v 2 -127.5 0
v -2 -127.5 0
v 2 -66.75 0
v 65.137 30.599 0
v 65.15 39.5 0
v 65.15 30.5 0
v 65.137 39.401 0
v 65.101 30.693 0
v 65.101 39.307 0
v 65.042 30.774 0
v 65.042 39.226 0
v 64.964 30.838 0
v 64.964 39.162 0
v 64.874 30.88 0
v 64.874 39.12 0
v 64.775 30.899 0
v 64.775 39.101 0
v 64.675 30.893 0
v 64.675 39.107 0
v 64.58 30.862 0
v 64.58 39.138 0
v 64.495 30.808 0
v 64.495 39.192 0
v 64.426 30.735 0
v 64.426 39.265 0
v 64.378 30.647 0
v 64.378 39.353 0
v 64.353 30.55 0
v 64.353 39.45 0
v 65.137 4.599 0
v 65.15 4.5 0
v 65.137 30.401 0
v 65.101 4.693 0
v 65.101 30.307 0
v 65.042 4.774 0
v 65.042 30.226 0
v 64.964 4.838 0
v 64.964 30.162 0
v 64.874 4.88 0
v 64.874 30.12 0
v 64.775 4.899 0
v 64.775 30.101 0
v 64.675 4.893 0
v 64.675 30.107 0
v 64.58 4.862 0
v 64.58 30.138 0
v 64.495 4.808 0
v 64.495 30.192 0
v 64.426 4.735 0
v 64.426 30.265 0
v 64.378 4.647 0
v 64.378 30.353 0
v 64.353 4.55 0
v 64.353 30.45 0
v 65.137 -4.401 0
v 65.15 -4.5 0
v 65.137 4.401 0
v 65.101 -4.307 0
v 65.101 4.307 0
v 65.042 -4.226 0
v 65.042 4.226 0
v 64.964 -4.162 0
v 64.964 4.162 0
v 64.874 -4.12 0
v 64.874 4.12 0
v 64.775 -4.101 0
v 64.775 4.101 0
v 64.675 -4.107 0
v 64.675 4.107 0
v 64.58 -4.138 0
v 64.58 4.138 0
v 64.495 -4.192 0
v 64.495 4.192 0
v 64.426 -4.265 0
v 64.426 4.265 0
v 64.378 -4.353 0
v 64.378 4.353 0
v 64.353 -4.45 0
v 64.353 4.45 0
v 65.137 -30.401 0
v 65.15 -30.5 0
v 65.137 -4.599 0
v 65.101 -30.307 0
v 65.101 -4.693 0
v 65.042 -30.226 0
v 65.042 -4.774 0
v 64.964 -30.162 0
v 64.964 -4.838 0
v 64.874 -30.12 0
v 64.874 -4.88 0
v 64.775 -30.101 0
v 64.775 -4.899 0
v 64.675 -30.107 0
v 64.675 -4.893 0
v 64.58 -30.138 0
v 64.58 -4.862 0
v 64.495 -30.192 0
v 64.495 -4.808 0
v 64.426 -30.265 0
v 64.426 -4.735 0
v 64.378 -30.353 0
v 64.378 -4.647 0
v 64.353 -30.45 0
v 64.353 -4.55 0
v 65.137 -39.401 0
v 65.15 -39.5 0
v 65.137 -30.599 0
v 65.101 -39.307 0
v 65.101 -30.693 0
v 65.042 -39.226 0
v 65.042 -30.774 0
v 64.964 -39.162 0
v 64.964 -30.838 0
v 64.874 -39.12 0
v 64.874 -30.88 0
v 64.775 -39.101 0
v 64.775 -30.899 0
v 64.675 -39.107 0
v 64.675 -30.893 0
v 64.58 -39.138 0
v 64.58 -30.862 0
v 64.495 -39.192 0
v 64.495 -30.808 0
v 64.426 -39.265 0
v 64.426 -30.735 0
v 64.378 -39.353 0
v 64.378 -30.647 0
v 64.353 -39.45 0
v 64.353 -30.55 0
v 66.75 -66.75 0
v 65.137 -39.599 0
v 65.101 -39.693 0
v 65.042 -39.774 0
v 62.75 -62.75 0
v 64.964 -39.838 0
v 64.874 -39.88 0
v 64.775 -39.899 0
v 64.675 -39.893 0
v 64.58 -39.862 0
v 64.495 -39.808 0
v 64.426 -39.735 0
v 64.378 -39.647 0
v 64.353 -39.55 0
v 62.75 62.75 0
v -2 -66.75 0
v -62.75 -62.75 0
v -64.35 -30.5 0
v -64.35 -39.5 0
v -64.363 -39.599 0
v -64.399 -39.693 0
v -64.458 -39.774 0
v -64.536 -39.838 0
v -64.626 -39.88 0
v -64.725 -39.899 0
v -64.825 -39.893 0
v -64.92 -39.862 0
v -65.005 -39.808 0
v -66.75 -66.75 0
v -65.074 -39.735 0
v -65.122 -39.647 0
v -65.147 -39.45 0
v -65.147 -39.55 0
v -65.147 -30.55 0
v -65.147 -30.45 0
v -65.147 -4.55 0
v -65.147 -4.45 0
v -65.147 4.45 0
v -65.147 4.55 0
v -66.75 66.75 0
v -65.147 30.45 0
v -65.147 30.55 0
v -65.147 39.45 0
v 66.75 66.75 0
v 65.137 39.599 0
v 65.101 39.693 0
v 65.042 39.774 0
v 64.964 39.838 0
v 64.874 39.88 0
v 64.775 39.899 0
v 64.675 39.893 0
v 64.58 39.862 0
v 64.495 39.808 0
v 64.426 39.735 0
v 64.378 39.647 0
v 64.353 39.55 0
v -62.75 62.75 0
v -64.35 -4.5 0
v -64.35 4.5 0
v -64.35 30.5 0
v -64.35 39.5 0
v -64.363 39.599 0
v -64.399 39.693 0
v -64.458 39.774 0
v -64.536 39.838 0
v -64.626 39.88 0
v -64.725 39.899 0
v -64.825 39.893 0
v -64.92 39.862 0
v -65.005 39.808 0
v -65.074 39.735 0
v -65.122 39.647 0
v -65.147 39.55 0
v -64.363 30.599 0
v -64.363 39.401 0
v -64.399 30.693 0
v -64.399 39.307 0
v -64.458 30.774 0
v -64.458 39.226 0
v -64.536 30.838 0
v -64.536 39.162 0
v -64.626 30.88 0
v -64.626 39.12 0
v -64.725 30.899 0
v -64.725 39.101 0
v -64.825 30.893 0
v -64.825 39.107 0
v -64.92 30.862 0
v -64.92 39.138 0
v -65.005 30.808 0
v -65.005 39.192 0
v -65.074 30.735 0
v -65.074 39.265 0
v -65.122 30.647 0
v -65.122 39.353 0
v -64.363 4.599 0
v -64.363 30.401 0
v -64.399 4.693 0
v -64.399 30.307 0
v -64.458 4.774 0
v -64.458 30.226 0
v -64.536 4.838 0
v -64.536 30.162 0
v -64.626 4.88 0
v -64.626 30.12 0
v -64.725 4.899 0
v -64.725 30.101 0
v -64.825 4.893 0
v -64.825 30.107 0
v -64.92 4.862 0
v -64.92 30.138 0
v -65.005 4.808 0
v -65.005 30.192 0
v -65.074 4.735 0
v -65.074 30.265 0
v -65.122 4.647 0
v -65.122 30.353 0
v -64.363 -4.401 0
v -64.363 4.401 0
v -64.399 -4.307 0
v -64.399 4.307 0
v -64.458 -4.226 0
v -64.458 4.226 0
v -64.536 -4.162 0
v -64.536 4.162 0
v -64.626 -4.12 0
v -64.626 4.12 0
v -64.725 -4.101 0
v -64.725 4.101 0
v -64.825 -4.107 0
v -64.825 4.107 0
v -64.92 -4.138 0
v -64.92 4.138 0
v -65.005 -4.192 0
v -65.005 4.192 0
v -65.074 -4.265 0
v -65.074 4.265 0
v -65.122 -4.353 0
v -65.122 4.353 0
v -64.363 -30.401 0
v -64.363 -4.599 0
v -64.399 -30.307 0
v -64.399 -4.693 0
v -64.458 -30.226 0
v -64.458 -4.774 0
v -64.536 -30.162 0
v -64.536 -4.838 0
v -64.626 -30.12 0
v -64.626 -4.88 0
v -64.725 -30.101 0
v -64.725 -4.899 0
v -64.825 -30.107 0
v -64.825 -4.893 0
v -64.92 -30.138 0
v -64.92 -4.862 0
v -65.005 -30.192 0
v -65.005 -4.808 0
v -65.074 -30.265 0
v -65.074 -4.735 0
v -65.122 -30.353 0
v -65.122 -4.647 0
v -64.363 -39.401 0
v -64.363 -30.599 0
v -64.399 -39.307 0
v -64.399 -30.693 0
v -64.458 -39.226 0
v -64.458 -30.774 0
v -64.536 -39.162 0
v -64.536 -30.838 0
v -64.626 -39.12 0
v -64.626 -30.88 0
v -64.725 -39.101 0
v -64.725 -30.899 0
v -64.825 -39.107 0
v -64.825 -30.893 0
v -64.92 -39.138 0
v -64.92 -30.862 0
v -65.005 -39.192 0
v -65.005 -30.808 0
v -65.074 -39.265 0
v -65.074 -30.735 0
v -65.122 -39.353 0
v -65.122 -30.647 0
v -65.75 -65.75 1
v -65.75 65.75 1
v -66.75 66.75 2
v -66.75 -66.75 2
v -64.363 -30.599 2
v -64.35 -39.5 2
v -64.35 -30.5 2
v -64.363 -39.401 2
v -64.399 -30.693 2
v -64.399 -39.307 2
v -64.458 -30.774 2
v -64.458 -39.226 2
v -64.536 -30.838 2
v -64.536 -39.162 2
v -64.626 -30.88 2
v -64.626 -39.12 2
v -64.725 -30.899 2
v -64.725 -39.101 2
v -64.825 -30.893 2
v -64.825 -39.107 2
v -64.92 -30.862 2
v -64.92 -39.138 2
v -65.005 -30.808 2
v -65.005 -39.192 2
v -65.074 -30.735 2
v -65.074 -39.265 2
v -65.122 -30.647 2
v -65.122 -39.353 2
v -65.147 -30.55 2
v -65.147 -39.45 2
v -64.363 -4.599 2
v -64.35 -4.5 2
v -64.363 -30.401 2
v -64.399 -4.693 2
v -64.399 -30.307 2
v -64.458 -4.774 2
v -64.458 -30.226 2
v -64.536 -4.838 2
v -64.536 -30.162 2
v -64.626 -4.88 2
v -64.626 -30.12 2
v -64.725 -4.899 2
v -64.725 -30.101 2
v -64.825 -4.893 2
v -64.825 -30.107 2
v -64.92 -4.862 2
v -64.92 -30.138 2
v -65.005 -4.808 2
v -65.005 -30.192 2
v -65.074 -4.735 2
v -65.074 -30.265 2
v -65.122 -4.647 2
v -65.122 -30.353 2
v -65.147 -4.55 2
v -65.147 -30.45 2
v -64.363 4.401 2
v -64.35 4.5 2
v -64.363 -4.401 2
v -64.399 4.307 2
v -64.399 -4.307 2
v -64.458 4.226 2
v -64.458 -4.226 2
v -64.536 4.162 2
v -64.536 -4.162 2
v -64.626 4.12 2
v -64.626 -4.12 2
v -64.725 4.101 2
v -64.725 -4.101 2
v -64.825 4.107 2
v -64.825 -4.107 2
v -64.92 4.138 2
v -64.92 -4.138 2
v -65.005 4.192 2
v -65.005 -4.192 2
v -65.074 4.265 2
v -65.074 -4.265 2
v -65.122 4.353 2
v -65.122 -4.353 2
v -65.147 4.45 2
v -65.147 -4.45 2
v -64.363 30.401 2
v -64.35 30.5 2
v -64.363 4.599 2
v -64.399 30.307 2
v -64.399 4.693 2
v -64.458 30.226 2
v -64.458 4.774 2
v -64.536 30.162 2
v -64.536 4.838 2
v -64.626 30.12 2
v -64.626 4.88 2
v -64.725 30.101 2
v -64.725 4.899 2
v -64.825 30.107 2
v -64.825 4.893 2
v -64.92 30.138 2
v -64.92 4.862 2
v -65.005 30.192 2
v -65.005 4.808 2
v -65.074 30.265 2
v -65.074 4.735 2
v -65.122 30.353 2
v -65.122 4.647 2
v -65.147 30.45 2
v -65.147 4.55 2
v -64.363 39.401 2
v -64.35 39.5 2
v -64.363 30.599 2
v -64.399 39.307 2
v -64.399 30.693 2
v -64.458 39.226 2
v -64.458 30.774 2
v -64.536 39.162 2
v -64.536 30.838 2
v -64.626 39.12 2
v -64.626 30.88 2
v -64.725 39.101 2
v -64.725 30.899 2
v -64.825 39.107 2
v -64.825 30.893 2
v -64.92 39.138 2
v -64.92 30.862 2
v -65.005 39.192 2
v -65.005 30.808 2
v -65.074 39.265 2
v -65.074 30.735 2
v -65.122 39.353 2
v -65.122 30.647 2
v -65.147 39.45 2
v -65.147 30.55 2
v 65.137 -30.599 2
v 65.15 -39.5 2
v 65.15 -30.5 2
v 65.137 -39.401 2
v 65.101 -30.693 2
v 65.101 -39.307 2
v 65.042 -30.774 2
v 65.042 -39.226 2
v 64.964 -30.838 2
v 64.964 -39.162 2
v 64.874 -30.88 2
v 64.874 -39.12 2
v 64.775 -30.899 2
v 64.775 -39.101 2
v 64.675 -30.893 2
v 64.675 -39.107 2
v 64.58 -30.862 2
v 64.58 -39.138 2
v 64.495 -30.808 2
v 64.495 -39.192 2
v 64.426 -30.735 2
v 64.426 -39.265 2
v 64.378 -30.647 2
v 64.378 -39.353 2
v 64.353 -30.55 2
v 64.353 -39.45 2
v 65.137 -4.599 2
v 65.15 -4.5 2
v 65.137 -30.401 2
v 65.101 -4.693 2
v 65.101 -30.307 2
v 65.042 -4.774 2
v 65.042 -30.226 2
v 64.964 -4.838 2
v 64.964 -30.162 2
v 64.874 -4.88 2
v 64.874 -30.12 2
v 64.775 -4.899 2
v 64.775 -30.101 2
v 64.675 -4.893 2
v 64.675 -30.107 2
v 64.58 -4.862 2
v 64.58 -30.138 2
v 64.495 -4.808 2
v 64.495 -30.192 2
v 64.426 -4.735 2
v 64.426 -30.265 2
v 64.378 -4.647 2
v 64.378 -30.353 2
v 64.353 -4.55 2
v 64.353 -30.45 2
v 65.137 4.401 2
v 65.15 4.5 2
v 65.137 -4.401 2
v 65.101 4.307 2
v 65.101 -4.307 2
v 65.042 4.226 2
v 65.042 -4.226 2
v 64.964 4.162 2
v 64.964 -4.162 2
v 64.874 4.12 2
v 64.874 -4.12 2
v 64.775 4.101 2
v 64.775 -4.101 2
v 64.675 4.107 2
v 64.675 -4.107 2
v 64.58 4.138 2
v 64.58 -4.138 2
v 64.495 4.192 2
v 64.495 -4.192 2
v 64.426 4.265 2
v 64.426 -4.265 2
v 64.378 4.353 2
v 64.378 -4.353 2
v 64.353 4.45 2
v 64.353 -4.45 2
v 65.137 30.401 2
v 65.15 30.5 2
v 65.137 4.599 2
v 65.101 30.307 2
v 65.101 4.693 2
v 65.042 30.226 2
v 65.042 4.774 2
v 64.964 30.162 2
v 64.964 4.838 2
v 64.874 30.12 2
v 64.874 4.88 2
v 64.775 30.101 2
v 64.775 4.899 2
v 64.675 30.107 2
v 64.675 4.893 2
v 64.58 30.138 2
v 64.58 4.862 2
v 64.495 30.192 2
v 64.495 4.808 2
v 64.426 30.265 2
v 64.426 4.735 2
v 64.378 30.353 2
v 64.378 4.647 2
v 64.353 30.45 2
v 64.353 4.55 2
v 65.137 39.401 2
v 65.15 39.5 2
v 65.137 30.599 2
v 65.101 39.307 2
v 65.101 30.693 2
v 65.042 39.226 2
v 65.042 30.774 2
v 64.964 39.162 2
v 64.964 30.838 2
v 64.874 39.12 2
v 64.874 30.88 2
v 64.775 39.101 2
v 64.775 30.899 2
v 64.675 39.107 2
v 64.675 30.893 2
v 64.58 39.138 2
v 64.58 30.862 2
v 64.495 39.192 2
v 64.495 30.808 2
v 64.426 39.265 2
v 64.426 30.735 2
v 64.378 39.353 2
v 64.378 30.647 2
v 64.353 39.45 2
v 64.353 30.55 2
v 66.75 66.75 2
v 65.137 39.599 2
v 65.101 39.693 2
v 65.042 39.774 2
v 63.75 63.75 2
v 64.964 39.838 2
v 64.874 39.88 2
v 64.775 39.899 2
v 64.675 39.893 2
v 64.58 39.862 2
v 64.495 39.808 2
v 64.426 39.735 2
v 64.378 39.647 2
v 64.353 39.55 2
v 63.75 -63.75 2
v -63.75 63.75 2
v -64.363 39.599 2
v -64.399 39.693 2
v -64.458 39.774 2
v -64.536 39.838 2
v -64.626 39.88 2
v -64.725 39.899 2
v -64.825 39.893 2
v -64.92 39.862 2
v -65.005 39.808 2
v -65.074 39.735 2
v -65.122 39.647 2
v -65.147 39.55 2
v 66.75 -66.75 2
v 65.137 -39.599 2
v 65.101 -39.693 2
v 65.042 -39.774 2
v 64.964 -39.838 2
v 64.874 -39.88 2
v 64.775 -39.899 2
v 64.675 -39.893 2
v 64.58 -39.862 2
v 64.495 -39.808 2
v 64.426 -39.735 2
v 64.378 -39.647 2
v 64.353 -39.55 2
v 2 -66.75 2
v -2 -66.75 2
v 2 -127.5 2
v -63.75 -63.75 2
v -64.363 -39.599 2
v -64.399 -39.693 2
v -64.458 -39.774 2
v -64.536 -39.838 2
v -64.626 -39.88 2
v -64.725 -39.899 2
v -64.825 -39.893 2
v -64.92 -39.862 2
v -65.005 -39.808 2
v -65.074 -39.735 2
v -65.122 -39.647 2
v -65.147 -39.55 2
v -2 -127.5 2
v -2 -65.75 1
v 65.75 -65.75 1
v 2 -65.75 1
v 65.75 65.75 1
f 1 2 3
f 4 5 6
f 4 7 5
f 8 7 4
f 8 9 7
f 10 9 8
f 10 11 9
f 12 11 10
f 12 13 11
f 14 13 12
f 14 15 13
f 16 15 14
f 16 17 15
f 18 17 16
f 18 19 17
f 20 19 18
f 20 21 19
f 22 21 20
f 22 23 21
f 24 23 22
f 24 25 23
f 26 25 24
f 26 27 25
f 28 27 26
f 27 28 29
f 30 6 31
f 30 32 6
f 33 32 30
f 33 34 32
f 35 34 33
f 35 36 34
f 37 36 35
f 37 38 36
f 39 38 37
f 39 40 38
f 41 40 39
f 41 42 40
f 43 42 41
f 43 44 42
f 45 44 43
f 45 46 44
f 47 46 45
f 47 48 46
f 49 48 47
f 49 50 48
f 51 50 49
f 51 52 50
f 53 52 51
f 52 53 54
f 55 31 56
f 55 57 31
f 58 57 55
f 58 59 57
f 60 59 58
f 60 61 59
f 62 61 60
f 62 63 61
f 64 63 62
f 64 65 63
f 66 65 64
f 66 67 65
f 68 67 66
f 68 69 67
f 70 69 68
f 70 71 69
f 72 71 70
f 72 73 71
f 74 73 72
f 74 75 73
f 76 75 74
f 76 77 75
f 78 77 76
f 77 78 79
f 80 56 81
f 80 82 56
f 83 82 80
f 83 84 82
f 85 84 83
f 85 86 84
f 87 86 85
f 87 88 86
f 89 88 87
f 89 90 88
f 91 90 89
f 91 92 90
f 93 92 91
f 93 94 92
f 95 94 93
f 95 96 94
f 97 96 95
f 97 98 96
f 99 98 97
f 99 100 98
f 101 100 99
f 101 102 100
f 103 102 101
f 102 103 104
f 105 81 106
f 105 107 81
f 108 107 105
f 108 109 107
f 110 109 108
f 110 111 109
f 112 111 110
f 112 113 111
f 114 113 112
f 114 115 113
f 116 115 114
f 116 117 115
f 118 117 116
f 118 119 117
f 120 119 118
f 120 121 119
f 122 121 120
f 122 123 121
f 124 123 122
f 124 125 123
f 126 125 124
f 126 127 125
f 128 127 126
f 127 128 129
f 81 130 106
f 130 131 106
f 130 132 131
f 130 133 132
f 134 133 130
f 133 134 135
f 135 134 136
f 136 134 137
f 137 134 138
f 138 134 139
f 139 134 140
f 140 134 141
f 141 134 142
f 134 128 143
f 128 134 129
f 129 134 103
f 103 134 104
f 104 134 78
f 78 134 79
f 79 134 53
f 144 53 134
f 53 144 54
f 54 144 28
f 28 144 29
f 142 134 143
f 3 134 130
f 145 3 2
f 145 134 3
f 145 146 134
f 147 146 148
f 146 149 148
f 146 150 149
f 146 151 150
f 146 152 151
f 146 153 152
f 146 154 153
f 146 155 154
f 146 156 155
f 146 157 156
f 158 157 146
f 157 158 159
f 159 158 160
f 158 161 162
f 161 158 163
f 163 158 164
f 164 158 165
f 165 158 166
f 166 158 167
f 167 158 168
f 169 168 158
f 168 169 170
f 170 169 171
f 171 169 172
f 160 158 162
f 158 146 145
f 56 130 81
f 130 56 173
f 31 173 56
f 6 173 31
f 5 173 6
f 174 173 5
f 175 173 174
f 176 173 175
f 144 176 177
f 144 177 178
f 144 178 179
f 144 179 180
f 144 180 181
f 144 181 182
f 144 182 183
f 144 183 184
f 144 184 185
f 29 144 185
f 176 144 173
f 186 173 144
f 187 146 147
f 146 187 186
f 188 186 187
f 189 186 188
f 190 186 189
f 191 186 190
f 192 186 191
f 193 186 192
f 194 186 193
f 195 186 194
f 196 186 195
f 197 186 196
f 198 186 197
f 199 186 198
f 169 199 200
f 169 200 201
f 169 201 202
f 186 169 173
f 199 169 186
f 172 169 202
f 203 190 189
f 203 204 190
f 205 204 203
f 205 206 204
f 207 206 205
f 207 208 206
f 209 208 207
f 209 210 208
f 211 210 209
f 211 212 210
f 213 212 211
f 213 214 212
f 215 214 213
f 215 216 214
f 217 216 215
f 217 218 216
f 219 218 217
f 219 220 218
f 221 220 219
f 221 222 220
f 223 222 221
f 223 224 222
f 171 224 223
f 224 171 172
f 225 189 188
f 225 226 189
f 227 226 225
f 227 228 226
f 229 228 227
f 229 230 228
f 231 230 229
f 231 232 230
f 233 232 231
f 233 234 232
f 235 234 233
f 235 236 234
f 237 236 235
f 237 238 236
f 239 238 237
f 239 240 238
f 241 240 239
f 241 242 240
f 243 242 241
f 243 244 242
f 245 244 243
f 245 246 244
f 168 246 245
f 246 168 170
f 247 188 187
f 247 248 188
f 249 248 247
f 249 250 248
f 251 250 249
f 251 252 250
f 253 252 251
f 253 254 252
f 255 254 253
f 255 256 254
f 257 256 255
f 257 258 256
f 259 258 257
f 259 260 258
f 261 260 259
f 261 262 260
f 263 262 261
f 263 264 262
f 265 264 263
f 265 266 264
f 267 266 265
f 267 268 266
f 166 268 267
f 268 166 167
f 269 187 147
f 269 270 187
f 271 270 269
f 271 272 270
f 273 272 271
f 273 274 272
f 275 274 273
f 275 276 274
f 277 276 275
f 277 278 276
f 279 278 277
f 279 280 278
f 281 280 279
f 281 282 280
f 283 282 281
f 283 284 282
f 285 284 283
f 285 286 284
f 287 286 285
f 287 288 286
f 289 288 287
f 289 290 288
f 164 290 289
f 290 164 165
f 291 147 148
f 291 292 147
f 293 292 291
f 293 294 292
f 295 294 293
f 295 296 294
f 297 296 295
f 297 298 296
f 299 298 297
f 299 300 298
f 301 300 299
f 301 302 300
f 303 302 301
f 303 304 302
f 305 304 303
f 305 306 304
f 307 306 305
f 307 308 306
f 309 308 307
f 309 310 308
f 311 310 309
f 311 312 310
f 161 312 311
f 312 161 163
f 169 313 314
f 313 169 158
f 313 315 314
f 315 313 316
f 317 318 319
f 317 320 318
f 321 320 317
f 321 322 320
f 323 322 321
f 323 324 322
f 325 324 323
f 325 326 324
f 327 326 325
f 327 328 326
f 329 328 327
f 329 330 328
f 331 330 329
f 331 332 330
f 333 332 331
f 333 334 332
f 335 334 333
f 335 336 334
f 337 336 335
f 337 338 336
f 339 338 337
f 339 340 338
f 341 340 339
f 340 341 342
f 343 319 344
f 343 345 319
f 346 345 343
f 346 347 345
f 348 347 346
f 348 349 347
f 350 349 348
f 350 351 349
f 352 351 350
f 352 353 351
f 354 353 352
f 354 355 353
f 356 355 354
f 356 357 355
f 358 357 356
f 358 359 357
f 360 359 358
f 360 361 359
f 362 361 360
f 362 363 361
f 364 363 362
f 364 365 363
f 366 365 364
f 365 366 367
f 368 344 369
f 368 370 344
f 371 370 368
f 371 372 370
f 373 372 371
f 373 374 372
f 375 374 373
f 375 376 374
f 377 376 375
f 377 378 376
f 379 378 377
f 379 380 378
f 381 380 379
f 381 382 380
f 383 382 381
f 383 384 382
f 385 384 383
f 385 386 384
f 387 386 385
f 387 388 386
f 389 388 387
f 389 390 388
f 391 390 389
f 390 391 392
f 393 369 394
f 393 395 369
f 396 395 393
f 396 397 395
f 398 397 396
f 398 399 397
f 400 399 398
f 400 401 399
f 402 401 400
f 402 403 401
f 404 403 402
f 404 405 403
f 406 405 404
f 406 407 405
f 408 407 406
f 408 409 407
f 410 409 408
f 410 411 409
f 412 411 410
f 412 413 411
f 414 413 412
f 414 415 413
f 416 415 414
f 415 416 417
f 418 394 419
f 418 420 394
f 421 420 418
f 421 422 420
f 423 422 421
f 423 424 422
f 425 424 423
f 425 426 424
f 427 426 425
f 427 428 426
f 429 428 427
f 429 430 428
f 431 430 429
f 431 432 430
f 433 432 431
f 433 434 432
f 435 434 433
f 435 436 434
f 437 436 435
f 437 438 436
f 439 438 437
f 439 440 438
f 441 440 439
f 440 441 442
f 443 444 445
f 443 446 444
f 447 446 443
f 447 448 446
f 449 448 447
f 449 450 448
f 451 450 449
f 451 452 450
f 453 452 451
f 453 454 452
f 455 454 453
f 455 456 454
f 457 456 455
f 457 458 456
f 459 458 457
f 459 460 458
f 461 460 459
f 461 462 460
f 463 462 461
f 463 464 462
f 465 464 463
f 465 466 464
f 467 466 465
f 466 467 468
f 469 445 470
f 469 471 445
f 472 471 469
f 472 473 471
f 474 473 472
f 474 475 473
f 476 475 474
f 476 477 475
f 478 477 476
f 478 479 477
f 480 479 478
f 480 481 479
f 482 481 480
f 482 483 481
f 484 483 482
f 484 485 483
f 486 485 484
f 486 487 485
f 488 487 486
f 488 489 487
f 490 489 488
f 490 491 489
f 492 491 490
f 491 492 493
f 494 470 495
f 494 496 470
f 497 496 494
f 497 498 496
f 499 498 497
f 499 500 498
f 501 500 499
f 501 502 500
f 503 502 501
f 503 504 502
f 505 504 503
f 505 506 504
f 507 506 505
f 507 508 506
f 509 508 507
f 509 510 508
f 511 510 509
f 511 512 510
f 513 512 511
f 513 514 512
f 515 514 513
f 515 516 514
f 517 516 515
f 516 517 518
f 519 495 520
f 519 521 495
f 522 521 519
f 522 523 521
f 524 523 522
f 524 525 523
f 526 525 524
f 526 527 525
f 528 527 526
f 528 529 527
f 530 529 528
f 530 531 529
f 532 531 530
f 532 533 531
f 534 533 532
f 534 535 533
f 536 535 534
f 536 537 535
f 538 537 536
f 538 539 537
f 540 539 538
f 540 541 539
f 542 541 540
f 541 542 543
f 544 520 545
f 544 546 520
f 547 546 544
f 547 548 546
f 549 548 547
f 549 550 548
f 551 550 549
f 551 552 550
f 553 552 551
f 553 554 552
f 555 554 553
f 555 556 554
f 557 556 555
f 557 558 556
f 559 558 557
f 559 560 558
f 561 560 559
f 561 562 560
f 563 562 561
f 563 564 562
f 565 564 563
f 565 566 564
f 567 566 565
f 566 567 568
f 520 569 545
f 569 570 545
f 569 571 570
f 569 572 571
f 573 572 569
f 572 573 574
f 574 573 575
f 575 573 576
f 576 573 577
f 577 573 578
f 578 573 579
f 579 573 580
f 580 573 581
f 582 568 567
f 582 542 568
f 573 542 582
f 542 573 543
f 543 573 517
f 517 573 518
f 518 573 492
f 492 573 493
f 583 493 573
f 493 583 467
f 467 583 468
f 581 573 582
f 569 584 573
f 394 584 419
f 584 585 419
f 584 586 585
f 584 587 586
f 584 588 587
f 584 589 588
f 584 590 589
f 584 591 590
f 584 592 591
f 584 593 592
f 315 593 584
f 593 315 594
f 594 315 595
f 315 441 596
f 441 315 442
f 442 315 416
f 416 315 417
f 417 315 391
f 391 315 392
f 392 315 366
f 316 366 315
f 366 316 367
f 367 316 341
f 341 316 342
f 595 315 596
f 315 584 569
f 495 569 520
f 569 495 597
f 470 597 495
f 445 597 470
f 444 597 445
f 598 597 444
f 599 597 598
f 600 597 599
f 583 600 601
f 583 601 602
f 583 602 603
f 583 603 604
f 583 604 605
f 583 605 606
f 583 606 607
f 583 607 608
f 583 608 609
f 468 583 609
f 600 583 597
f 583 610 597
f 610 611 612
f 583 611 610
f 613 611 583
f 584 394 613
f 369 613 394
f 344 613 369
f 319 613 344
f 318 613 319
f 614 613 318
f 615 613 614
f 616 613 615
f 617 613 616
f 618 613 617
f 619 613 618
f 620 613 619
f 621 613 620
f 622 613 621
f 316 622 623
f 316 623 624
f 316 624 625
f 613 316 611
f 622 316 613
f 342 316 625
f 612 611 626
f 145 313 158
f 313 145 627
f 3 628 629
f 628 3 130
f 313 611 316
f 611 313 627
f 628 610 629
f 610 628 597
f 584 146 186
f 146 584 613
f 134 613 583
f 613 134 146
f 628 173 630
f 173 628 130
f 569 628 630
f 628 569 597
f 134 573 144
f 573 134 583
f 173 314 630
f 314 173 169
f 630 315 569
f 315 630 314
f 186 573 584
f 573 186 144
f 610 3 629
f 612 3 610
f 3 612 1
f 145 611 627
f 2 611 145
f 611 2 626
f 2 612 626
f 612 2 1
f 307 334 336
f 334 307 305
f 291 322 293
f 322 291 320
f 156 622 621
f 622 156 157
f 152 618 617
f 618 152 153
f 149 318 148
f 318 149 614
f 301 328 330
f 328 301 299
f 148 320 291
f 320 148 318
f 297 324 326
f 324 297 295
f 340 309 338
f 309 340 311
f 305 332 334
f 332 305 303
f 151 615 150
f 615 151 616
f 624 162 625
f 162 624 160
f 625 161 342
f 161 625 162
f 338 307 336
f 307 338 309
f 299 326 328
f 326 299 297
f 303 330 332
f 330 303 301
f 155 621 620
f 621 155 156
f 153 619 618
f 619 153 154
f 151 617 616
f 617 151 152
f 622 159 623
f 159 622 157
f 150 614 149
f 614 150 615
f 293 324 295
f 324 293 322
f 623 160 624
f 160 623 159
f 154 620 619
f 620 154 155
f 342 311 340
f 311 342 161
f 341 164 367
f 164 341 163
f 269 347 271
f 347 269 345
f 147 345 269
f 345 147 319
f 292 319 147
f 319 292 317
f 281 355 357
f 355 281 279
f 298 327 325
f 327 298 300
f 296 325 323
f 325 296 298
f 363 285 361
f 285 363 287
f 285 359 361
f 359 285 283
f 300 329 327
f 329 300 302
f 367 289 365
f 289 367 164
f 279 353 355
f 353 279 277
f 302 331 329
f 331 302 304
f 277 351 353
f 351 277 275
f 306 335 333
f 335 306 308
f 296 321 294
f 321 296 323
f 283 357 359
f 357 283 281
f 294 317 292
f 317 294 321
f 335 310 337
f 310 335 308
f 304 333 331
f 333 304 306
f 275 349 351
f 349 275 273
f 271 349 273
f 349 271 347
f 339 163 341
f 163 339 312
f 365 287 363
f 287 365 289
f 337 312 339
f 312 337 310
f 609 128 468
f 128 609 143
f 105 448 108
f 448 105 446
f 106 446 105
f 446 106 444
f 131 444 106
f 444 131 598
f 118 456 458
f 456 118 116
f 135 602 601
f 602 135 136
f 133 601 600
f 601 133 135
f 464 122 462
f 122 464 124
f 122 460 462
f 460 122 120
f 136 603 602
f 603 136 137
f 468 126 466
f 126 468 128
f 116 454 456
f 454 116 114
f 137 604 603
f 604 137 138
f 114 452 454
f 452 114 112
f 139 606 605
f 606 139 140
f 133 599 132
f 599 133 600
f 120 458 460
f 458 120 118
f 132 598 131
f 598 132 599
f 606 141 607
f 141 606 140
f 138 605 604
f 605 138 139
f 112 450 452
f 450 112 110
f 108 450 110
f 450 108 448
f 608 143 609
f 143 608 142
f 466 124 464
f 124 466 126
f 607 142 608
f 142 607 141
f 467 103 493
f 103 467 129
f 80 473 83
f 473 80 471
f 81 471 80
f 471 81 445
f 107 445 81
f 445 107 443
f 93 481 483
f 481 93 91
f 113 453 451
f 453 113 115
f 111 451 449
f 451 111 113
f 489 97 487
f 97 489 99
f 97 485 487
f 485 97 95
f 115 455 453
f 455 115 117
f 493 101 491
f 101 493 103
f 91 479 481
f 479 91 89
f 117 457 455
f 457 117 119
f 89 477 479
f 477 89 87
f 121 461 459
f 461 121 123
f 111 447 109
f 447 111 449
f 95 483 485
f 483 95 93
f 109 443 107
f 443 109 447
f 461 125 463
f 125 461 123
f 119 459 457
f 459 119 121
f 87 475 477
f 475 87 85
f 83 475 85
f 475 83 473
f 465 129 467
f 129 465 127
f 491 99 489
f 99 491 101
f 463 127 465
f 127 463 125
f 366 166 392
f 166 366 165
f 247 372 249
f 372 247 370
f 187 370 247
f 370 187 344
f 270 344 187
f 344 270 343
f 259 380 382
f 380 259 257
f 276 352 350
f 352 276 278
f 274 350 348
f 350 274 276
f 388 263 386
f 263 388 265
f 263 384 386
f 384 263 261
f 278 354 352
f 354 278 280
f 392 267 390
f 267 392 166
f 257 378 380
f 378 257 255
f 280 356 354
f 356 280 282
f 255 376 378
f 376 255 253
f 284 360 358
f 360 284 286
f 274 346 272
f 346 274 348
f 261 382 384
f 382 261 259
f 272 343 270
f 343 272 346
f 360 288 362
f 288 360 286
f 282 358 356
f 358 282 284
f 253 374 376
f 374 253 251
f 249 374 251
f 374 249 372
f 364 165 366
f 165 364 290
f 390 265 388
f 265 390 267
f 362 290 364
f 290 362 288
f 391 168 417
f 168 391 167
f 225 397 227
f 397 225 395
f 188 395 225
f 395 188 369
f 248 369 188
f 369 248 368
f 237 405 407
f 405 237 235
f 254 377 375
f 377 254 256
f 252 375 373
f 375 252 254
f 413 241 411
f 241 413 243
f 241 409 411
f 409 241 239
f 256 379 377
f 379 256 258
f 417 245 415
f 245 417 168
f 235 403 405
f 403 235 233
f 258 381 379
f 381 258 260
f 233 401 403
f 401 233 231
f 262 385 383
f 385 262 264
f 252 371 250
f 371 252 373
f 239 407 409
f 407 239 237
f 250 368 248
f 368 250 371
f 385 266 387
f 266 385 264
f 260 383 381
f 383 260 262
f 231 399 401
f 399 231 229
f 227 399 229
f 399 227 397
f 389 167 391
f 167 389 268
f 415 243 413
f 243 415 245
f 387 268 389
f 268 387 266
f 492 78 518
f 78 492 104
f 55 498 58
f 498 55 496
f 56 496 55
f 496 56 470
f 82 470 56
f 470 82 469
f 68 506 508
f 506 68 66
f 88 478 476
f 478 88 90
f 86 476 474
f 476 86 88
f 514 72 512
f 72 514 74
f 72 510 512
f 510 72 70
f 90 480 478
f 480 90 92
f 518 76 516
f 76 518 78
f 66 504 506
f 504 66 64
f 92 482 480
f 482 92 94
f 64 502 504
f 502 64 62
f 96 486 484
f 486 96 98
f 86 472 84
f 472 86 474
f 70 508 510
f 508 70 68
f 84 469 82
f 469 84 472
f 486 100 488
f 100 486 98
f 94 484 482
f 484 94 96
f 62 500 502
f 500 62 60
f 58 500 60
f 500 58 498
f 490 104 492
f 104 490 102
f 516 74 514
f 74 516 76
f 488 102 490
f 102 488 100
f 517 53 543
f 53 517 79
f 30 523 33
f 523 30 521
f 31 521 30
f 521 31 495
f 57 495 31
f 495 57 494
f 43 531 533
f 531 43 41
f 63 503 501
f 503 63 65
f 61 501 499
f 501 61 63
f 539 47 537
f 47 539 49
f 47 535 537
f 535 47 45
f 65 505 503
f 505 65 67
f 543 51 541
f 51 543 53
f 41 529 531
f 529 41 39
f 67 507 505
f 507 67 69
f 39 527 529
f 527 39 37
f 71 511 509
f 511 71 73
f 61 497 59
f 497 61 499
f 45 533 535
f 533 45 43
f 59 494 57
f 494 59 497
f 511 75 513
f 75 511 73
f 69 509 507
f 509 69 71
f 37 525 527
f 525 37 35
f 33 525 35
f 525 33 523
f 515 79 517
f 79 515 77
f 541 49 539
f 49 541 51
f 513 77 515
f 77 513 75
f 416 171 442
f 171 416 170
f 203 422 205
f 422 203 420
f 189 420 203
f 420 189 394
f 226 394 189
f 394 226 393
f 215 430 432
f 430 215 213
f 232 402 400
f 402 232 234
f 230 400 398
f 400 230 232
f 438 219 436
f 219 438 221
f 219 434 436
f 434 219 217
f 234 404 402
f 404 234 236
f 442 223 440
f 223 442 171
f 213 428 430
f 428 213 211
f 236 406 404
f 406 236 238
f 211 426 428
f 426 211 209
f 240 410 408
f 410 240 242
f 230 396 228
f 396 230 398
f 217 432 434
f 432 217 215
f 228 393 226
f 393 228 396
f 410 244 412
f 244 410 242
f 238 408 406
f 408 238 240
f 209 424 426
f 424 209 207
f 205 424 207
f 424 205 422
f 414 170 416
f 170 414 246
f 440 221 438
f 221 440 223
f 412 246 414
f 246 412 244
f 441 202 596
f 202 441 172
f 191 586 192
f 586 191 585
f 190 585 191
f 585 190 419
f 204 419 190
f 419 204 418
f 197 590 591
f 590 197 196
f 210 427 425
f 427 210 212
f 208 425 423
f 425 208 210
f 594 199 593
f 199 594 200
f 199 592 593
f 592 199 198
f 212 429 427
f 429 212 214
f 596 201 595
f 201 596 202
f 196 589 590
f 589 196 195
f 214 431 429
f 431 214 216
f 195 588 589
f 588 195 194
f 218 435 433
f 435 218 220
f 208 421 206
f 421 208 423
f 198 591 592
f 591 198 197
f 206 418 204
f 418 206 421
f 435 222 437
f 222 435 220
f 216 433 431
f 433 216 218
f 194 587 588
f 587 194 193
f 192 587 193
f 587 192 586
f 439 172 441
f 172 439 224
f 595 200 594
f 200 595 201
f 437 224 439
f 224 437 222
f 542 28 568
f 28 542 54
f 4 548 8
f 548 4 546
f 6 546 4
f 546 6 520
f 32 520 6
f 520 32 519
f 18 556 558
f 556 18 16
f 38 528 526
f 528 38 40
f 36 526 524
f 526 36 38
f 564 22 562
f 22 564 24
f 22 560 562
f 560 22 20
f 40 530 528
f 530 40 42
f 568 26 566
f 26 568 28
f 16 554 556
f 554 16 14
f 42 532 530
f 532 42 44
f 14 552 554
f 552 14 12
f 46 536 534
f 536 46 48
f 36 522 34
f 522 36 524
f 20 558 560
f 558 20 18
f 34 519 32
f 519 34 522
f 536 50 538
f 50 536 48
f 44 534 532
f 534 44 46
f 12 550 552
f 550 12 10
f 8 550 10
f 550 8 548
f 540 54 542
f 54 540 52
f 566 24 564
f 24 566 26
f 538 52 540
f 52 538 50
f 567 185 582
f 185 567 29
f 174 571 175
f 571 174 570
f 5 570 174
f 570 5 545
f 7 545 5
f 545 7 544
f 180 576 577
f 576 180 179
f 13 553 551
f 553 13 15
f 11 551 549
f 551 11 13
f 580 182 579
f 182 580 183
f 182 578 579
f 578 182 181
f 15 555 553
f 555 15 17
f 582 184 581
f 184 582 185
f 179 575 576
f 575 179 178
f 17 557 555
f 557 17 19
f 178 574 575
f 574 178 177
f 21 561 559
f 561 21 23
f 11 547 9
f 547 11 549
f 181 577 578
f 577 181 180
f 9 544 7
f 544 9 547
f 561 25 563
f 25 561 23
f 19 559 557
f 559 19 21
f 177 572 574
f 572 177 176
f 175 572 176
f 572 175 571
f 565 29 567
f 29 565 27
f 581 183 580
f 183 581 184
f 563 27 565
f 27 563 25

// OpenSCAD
solar_cell_diameter = 125;
solar_cell_diameter_diagonal = 160;
solar_cell_to_frame_gap = 0.25;
solar_frame_diameter = 4;
solar_frame_thickness = 2;
solar_frame_length = solar_cell_diameter + (solar_cell_to_frame_gap + solar_frame_diameter) * 2;
solar_frame_length_diagonal = solar_cell_diameter_diagonal + (solar_cell_to_frame_gap + solar_frame_diameter) * 2;
solar_facet_diameter = solar_cell_diameter + (solar_cell_to_frame_gap + solar_frame_diameter + 3) * 2;
solar_staple_width = 9;
solar_staple_diameter = 0.8;

module solar_panel_frame_side(length) {
    linear_extrude(height = length, convexity = 10, center = false) {
        polygon(points = [
            [0, 0],
            [-solar_frame_thickness / 2, -solar_frame_thickness],
            [-solar_frame_diameter, -solar_frame_thickness],
            [-solar_frame_diameter + solar_frame_thickness / 2, -solar_frame_thickness / 2],
            [-solar_frame_diameter, 0]
        ]);
    }
}

module solar_panel_frame_corner(length) {
    union() {
        intersection() {
            solar_panel_frame_side(length / 2);
            translate([length / 2 - solar_frame_diameter, 0, solar_frame_diameter]) {
                rotate([0, -90, 0]) {
                    solar_panel_frame_side(length / 2);
                }
            }
        }
        translate([0, 0, solar_frame_diameter / 2]) {
            solar_panel_frame_side(length / 2 - solar_frame_diameter / 2);
        }
        translate([length / 2 - solar_frame_diameter, 0, solar_frame_diameter]) {
            rotate([0, -90, 0]) {
                solar_panel_frame_side(length / 2 - solar_frame_diameter / 2);
            }
        }
    }
}

module solar_panel_frame_sides(length) {
    for (i = [0 : 3]) {
        rotate([0, 0, i * 90]) {
            rotate([-90, 0, 0]) {
                translate([-length / 2 + solar_frame_diameter, 0, -length / 2]) {
                    solar_panel_frame_corner(length);
                }
            }
        }
    }
}

module solar_cell(
        main_diameter = 125,
        diagonal_diameter = 160,
        thickness = 2) {
    difference() {
        union() {
            solar_panel_frame_sides(solar_frame_length);
            /*rotate([0, 0, 45]) {
                solar_panel_frame_sides(solar_frame_length_diagonal);
            }*/
            translate([-solar_frame_diameter / 2, -solar_frame_length + solar_frame_diameter * 1.5, 0]) {
                cube([solar_frame_diameter, solar_cell_diameter / 2, solar_frame_thickness]);
            }
        }
        for (i = [-1 : 1]) {
            translate([0, i * 35, 0]) {
                translate([-(solar_frame_length - solar_frame_diameter) / 2, -solar_staple_width / 2, -0.1]) {
                    cylinder(h = solar_frame_thickness + 1, d = solar_staple_diameter, $fn = 25);
                }
                translate([-(solar_frame_length - solar_frame_diameter) / 2, solar_staple_width / 2, -0.1]) {
                    cylinder(h = solar_frame_thickness + 1, d = solar_staple_diameter, $fn = 25);
                }
                translate([(solar_frame_length - solar_frame_diameter) / 2, -solar_staple_width / 2, -0.1]) {
                    cylinder(h = solar_frame_thickness + 1, d = solar_staple_diameter, $fn = 25);
                }
                translate([(solar_frame_length - solar_frame_diameter) / 2, solar_staple_width / 2, -0.1]) {
                    cylinder(h = solar_frame_thickness + 1, d = solar_staple_diameter, $fn = 25);
                }
            }
        }
    }
}

solar_cell();
